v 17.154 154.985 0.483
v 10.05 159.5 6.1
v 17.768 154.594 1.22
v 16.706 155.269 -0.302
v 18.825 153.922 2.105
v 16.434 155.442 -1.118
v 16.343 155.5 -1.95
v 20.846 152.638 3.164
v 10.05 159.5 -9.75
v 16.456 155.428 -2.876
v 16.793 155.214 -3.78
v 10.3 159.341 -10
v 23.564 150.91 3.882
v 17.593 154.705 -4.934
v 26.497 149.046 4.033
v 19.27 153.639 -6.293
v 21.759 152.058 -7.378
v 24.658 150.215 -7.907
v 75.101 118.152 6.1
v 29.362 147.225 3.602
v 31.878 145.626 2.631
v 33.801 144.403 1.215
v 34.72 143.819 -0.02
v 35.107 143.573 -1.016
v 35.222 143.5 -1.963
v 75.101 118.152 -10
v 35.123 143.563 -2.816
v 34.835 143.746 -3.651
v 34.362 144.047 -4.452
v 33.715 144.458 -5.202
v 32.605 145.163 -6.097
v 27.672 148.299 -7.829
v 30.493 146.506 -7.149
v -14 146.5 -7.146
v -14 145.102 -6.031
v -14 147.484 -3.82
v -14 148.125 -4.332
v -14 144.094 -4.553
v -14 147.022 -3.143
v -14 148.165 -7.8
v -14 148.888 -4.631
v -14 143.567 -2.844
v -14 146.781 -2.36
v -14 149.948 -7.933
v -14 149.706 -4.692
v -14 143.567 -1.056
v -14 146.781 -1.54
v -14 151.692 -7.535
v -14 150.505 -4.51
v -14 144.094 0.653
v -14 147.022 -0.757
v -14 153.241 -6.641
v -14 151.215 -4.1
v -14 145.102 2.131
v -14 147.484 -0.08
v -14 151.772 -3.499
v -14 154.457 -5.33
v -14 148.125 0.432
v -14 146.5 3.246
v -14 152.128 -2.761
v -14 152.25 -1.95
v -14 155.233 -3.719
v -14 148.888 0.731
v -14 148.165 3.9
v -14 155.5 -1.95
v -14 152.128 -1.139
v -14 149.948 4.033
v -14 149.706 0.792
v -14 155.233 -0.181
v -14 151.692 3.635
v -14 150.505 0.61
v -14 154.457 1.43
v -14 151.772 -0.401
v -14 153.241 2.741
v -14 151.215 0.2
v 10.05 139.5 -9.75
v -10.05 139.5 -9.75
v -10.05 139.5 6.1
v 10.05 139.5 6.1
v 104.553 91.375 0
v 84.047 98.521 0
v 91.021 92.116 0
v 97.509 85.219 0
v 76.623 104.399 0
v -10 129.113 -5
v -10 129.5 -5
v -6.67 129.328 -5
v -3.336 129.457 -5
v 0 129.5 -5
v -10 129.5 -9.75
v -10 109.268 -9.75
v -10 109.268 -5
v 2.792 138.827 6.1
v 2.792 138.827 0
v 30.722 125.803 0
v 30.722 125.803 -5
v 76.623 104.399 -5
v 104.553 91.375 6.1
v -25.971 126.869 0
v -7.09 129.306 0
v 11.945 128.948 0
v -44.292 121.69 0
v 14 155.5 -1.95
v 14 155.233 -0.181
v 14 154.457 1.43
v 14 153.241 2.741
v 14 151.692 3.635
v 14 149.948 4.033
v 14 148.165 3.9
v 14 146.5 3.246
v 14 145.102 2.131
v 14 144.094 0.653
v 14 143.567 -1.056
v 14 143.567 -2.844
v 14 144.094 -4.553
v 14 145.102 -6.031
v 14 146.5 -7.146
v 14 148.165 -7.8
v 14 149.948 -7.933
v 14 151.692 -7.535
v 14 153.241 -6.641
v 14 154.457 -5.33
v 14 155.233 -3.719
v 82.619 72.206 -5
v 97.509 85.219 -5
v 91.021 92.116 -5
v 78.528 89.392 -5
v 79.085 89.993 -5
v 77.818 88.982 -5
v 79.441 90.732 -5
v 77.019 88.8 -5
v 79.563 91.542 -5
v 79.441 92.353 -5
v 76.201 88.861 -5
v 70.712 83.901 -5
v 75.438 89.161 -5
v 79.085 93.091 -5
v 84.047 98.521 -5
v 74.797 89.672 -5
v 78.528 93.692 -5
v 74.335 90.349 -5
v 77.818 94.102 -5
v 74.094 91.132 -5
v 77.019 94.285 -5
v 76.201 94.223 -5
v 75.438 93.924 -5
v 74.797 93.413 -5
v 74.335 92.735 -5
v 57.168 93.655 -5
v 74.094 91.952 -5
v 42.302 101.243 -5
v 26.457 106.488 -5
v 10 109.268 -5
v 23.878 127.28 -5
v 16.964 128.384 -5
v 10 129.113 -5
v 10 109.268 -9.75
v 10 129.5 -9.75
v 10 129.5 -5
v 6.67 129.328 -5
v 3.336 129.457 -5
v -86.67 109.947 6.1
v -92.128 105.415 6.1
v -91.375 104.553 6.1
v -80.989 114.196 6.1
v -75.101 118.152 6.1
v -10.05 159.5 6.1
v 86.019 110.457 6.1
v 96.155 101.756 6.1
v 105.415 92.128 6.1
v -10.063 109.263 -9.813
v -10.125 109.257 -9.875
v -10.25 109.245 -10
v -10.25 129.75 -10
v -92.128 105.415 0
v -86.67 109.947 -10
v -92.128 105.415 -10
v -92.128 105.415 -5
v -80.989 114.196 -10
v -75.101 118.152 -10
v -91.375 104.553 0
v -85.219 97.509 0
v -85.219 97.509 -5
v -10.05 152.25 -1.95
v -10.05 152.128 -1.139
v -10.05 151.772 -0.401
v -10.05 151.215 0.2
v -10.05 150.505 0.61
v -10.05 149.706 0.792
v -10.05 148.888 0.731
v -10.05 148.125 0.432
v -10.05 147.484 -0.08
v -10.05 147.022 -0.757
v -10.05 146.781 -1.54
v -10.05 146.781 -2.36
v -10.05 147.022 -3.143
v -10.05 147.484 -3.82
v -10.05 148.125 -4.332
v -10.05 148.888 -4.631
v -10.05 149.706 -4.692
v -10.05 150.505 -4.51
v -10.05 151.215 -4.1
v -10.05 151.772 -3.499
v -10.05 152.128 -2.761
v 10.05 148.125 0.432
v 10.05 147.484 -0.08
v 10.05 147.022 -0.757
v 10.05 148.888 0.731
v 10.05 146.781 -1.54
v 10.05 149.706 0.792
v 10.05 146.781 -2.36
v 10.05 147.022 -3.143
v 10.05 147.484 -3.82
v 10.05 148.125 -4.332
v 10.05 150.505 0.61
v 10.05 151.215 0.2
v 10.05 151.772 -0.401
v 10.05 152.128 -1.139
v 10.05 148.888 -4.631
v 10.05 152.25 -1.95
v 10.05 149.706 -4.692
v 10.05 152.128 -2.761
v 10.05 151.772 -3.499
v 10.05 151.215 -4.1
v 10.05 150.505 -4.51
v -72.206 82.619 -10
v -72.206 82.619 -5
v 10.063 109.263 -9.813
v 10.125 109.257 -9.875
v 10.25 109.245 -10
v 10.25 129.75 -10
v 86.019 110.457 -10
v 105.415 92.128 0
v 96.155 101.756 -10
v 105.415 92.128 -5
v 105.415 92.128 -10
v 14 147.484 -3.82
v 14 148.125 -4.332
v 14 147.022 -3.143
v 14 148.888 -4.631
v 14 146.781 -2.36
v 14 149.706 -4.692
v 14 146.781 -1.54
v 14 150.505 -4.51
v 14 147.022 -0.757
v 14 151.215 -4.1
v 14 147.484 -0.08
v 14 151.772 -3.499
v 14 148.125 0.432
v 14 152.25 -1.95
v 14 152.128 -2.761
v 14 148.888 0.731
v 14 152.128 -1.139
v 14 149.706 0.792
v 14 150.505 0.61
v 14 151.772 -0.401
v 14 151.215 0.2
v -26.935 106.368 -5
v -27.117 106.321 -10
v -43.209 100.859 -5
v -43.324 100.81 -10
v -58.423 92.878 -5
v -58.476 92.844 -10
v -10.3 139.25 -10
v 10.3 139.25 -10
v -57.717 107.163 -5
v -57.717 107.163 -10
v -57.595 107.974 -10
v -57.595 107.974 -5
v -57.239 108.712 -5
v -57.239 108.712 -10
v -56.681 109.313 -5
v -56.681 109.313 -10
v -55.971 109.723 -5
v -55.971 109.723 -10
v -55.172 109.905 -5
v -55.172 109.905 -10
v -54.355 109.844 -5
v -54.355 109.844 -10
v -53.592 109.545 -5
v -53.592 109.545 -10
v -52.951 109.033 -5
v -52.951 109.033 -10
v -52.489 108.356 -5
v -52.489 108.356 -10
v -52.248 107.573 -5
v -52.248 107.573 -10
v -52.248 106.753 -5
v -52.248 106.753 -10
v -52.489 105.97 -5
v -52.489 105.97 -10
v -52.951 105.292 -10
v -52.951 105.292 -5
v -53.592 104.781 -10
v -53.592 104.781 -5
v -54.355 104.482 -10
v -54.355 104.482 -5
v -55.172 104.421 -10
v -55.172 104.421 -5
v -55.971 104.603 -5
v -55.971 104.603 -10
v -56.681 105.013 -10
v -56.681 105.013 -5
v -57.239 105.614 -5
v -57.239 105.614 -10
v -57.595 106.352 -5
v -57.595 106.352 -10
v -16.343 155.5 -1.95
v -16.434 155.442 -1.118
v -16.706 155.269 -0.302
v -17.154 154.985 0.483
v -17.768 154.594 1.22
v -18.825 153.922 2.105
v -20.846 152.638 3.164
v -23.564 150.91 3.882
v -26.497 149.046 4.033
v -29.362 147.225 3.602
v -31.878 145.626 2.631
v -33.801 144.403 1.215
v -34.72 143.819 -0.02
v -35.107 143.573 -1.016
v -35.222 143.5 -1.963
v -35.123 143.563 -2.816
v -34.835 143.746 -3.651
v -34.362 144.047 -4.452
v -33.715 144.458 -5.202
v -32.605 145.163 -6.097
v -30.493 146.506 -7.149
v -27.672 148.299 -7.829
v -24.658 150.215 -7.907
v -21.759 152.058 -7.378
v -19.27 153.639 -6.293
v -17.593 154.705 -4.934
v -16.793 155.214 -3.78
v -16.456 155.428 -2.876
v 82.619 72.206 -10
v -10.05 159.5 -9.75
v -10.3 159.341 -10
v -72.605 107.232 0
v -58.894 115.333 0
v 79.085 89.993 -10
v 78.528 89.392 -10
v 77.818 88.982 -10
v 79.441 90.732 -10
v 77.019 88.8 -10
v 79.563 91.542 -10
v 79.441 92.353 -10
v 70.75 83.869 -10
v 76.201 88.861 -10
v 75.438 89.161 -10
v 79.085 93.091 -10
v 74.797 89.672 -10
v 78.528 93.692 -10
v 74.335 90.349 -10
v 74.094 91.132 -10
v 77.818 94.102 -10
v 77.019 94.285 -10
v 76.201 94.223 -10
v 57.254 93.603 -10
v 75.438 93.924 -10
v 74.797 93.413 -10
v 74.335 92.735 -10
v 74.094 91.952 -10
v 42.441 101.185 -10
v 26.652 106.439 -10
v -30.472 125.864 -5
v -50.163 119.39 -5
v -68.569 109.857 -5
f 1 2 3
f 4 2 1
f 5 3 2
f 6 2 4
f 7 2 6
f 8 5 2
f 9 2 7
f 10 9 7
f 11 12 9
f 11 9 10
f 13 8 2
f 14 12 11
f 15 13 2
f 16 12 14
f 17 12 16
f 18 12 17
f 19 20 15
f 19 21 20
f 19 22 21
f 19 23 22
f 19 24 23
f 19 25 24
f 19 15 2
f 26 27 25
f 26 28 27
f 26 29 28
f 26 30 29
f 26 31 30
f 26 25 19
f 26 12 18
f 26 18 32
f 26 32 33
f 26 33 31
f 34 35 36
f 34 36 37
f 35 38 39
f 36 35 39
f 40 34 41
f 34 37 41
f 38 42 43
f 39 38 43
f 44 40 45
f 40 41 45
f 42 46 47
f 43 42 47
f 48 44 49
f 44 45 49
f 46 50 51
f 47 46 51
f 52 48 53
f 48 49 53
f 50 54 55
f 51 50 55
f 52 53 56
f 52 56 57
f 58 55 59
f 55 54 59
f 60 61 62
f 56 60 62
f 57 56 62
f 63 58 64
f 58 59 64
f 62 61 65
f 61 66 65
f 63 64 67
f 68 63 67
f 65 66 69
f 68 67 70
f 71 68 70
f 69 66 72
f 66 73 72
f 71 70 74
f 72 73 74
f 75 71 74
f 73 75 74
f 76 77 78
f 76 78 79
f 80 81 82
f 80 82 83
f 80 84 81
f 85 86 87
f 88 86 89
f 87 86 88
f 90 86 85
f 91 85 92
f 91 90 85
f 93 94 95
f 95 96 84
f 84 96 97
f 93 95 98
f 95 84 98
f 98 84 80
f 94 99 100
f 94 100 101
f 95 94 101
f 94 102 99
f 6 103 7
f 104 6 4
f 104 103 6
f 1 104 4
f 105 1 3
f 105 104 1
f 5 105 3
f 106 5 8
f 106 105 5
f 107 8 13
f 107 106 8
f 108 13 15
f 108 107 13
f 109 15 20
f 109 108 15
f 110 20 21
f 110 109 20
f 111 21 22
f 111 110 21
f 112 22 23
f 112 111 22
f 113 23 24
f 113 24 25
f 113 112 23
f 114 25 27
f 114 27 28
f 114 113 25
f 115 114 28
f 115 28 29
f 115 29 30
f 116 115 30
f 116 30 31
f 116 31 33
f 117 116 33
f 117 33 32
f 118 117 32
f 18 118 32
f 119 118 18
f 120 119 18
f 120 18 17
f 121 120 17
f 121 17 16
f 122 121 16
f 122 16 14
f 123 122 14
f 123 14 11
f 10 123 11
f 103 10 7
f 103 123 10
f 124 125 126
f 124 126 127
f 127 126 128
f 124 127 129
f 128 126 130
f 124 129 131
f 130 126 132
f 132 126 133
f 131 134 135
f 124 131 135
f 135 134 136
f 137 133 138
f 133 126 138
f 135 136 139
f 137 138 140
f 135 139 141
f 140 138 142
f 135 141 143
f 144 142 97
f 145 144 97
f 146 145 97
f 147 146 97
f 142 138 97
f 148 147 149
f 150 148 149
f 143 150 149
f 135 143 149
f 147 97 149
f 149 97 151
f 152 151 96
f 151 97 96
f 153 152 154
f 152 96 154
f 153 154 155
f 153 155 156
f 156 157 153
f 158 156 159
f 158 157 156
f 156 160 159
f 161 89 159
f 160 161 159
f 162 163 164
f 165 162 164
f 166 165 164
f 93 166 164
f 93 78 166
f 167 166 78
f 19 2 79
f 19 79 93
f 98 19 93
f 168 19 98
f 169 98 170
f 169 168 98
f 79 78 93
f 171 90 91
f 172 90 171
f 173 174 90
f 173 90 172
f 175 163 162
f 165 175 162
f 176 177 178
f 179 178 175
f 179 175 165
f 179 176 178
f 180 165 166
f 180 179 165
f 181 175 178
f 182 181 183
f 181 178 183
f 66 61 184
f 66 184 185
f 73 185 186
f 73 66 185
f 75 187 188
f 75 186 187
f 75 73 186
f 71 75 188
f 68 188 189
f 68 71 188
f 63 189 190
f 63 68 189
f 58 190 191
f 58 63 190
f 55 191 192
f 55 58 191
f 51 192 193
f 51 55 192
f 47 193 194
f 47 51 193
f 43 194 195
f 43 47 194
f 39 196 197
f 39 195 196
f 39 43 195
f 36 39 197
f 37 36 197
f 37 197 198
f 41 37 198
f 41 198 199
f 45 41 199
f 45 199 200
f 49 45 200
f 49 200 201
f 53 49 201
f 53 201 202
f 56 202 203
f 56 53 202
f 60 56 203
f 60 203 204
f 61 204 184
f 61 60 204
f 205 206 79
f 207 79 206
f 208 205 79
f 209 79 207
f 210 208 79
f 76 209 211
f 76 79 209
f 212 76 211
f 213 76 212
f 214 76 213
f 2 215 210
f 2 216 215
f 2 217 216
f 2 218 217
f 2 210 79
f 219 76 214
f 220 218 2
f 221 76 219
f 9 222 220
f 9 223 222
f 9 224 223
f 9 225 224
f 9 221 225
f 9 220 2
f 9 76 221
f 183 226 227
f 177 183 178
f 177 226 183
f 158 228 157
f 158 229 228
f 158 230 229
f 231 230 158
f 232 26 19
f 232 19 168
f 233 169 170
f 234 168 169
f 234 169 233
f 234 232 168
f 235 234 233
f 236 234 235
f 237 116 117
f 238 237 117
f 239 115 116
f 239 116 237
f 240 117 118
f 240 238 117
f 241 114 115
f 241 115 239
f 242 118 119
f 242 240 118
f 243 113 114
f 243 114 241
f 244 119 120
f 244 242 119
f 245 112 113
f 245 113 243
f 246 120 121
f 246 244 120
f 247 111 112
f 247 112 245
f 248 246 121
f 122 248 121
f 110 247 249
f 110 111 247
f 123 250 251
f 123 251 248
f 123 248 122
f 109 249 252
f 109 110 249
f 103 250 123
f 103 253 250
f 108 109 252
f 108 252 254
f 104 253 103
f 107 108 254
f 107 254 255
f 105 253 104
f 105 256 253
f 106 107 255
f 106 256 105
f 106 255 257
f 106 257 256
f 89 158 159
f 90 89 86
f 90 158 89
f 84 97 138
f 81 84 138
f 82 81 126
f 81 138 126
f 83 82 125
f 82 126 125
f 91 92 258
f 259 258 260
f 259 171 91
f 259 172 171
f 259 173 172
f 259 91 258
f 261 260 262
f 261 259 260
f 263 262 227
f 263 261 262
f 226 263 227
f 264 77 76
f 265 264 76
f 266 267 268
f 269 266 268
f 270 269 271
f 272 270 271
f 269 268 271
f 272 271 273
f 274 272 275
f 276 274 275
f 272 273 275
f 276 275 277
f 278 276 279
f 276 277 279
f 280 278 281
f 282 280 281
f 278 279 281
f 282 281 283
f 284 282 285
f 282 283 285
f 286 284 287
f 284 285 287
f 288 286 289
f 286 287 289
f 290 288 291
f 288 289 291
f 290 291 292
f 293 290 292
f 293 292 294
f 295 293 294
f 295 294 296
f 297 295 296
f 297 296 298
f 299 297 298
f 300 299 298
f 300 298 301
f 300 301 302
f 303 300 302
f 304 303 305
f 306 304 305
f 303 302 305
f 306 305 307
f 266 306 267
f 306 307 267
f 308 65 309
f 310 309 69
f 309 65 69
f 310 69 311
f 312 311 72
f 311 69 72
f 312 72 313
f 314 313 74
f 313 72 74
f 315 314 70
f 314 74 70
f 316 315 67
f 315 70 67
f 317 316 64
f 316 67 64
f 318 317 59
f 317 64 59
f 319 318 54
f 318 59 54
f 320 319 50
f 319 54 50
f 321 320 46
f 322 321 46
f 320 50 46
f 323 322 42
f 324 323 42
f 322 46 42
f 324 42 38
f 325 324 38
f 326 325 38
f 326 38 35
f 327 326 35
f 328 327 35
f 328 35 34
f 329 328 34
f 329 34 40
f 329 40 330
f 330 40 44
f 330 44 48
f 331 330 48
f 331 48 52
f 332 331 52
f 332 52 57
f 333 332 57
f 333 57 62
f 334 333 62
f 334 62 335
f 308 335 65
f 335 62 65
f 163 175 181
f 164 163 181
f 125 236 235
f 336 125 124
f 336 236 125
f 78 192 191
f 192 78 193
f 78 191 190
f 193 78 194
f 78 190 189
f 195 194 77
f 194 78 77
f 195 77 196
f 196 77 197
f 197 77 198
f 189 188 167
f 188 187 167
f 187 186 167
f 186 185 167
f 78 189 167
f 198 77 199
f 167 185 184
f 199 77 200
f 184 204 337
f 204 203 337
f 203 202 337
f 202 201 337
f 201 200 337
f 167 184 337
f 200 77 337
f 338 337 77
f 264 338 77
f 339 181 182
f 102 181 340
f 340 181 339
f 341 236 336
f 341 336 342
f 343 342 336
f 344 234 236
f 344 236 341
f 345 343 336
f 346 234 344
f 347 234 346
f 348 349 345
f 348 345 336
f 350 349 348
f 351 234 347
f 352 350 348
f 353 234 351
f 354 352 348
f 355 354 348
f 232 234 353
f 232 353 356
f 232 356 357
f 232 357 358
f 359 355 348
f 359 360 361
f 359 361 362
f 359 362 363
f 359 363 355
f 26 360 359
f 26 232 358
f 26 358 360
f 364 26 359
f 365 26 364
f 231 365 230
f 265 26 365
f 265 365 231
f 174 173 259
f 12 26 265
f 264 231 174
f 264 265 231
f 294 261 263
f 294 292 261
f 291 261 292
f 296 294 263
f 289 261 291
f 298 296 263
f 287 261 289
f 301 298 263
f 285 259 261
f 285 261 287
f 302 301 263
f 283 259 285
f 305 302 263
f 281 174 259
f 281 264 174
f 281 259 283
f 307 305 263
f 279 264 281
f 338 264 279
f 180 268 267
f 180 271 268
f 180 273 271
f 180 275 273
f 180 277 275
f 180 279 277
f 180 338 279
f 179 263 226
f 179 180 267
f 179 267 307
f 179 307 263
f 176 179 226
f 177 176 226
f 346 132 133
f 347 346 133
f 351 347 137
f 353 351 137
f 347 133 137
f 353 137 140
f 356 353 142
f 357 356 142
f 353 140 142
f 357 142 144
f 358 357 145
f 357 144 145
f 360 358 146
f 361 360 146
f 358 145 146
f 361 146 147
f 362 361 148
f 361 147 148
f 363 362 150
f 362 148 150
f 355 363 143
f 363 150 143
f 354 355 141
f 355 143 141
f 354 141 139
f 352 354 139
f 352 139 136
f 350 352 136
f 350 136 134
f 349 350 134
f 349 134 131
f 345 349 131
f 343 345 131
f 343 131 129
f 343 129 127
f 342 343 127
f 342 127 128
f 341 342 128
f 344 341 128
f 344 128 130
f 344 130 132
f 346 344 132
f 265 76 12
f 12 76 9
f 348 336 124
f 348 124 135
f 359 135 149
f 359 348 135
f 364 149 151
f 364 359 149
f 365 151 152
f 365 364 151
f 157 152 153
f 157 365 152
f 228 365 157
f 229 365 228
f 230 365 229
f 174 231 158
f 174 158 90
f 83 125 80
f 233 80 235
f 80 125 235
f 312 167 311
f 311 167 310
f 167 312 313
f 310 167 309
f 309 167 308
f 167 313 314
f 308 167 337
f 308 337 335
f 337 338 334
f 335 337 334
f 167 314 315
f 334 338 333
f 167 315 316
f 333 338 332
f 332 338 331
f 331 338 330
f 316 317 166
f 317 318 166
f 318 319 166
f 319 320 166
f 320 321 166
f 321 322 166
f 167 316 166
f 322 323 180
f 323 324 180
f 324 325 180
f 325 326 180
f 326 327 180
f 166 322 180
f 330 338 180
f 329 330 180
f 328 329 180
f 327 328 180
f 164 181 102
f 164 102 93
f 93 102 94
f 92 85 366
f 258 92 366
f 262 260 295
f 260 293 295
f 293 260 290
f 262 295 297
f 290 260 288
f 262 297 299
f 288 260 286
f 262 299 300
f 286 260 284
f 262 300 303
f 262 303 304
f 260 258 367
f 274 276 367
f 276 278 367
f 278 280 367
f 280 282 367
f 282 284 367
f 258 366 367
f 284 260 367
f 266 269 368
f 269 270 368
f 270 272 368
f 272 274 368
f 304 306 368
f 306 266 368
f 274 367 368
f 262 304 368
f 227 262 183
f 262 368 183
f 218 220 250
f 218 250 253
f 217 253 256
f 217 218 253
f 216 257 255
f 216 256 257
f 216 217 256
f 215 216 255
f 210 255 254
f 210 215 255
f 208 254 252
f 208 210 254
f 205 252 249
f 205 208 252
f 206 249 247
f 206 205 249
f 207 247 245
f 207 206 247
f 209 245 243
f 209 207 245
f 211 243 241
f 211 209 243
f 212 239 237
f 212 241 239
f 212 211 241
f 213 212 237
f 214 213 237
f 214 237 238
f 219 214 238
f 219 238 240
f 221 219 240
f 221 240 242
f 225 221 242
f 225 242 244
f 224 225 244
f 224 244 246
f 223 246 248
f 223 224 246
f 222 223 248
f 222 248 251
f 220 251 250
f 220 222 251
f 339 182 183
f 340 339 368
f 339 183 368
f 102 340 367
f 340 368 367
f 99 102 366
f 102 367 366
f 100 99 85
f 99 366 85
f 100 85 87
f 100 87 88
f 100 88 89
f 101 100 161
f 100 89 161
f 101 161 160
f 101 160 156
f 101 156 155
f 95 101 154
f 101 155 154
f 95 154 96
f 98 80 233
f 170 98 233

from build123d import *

# Parameters (mm, degrees)
BOSS_EXTRUDE1_DEPTH     = 6.1
BOSS_EXTRUDE4_START     = -5
BOSS_EXTRUDE4_DEPTH     = 5
BOSS_EXTRUDE5_START     = 5
SKETCH6_R               = 2.75
BOSS_EXTRUDE5_DEPTH     = 5
SKETCH7_R               = 2.75
CUT_EXTRUDE1_DEPTH      = 176.534516689
BOSS_EXTRUDE6_START     = -10
BOSS_EXTRUDE6_DEPTH     = 16.1
CUT_EXTRUDE2_DEPTH      = 192.448730864
CUT_EXTRUDE2_DEPTH_BACK = 192.448730864
SKETCH9_W               = 20.1
SKETCH9_H               = 16.057013855
CUT_EXTRUDE3_DEPTH      = 198.16101231
CUT_EXTRUDE3_DEPTH_BACK = 198.16101231
SKETCH10_R              = 2.75
SKETCH11_R              = 6
CUT_EXTRUDE4_DEPTH      = 192.842324158
SKETCH12_R              = 6
CUT_EXTRUDE5_DEPTH      = 200.499981043
CHAMFER1_SIZE           = 0.25


with BuildPart() as part:
    # Sketch4 → Boss-Extrude1 (new body)
    with BuildSketch(Plane.XY):
        with BuildLine():
            Line((2.791805242, 138.827155544), (104.55323324, 91.375022364))
            Line((104.55323324, 91.375022364), (105.415210237, 92.128353131))
            ThreePointArc((105.415210237, 92.128353131), (9.395226761, 139.684393237), (-92.128353131, 105.415210237))
            Line((-92.128353131, 105.415210237), (-91.375022364, 104.55323324))
            Line((-91.375022364, 104.55323324), (2.791805242, 138.827155544))
        make_face()
    extrude(amount=BOSS_EXTRUDE1_DEPTH)

    # Sketch5 → Boss-Extrude4 (add)
    with BuildSketch(Plane.XY.offset(BOSS_EXTRUDE4_START)):
        with BuildLine():
            Line((30.722164617, 125.803015072), (76.622873865, 104.399162835))
            ThreePointArc((76.622873865, 104.399162835), (87.59255508, 95.382358403), (97.50906947, 85.218726646))
            Line((97.50906947, 85.218726646), (105.415210237, 92.128353131))
            ThreePointArc((105.415210237, 92.128353131), (9.395226761, 139.684393237), (-92.128353131, 105.415210237))
            Line((-92.128353131, 105.415210237), (-85.218726646, 97.50906947))
            ThreePointArc((-85.218726646, 97.50906947), (-30.701883618, 125.807966132), (30.722164617, 125.803015072))
        make_face()
    extrude(amount=BOSS_EXTRUDE4_DEPTH)

    # Sketch6 → Boss-Extrude5 (add)
    with BuildSketch(Plane(origin=(0, 0, -5), x_dir=(-1, 0, 0), z_dir=(0, 0, -1)).offset(BOSS_EXTRUDE5_START)):
        with BuildLine():
            Line((-10, 129.5), (10, 129.5))
            Line((10, 129.5), (10, 109.268365161))
            ThreePointArc((10, 109.268365161), (43.208620922, 100.85926186), (72.205596766, 82.619171024))
            Line((72.205596766, 82.619171024), (92.128353131, 105.415210237))
            ThreePointArc((92.128353131, 105.415210237), (-9.395226761, 139.684393237), (-105.415210237, 92.128353131))
            Line((-105.415210237, 92.128353131), (-82.619171024, 72.205596766))
            ThreePointArc((-82.619171024, 72.205596766), (-49.879754516, 97.732214313), (-10, 109.268365161))
            Line((-10, 109.268365161), (-10, 129.5))
        make_face()
        with Locations((54.966796439, 107.162966034)):
            Circle(SKETCH6_R, mode=Mode.SUBTRACT)
    extrude(amount=-BOSS_EXTRUDE5_DEPTH)

    # Sketch7 → Cut-Extrude1 (cut, through all)
    with BuildSketch(Plane.XY):
        with Locations((76.813119358, 91.542310953)):
            Circle(SKETCH7_R)
    extrude(amount=-CUT_EXTRUDE1_DEPTH, mode=Mode.SUBTRACT)

    # Sketch8 → Boss-Extrude6 (add)
    with BuildSketch(Plane.XY.offset(BOSS_EXTRUDE6_START)):
        with BuildLine():
            Line((-10.05, 139.638810866), (-10.05, 159.5))
            Line((-10.05, 159.5), (-75.100690367, 118.15196277))
            ThreePointArc((-75.100690367, 118.15196277), (-43.909921177, 132.935769536), (-10.05, 139.638810866))
        make_face()
        with BuildLine():
            Line((10.05, 139.638810866), (10.05, 159.5))
            Line((10.05, 159.5), (75.100690367, 118.15196277))
            ThreePointArc((75.100690367, 118.15196277), (43.909921177, 132.935769536), (10.05, 139.638810866))
        make_face()
    extrude(amount=BOSS_EXTRUDE6_DEPTH)

    # Sketch9 → Cut-Extrude2 (cut, two sides: drawn at the far end of the back side and taken through both)
    with BuildSketch(Plane.XY.offset(-CUT_EXTRUDE2_DEPTH_BACK)):
        with Locations((0, 147.528506928)):
            Rectangle(SKETCH9_W, SKETCH9_H)
    extrude(amount=CUT_EXTRUDE2_DEPTH + CUT_EXTRUDE2_DEPTH_BACK, mode=Mode.SUBTRACT)

    # Sketch10 → Cut-Extrude3 (cut, two sides: drawn at the far end of the back side and taken through both)
    with BuildSketch(Plane(origin=(-10.05, 0, 0), x_dir=(0, 0, -1), z_dir=(1, 0, 0)).offset(-CUT_EXTRUDE3_DEPTH_BACK)):
        with Locations(Location((1.95, 149.5, 0), (0, 0, 90))):
            Circle(SKETCH10_R)
    extrude(amount=CUT_EXTRUDE3_DEPTH + CUT_EXTRUDE3_DEPTH_BACK, mode=Mode.SUBTRACT)

    # Sketch11 → Cut-Extrude4 (cut, through all)
    with BuildSketch(Plane(origin=(14, 0, 0), x_dir=(0, 0, -1), z_dir=(1, 0, 0))):
        with Locations(Location((1.95, 149.5, 0), (0, 0, 90))):
            Circle(SKETCH11_R)
    extrude(amount=CUT_EXTRUDE4_DEPTH, mode=Mode.SUBTRACT)

    # Sketch12 → Cut-Extrude5 (cut, through all)
    with BuildSketch(Plane(origin=(-14, 0, 0), x_dir=(0, 0, -1), z_dir=(1, 0, 0))):
        with Locations(Location((1.95, 149.5, 0), (0, 0, 90))):
            Circle(SKETCH12_R)
    extrude(amount=-CUT_EXTRUDE5_DEPTH, mode=Mode.SUBTRACT)

    # Chamfer1
    chamfer1_edges = [part.edges().sort_by_distance(p)[0] for p in [
        (0, 139.5, -10),
        (10, 119.384182581, -10),
        (0, 129.5, -10),
        (-10, 119.384182581, -10),
        (10.05, 149.5, -10),
        (-10.05, 149.5, -10),
    ]]
    chamfer(chamfer1_edges, length=CHAMFER1_SIZE)


solid = part.part
